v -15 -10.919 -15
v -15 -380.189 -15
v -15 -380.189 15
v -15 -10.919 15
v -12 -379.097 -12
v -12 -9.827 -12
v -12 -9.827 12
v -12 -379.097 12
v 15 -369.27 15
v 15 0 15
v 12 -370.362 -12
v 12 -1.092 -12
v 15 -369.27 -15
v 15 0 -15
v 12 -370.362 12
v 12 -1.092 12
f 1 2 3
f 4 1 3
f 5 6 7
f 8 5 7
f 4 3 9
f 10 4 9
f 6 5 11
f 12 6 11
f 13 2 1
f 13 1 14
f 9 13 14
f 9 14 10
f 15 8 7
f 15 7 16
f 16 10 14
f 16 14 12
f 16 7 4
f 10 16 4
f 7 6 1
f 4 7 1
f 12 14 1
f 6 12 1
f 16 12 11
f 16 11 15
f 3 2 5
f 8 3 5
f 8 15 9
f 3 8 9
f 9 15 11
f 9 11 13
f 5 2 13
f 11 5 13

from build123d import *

# Parameters (mm, degrees)
F0_W     = 30
F0_H     = 30
F0_W_2   = 24
F0_H_2   = 24
F1_DEPTH = 500
F3_DEPTH = 30.001


with BuildPart() as f1:
    # F0 (on Front) → F1 (new body)
    with BuildSketch(Plane.XZ):
        Rectangle(F0_W, F0_H)
        Rectangle(F0_W_2, F0_H_2, mode=Mode.SUBTRACT)
    extrude(amount=F1_DEPTH)

    # F2 (on face) → F3 (cut, through all)
    with BuildSketch(Plane(origin=(0, 0, -15), x_dir=(1, 0, 0), z_dir=(0, 0, -1))):
        Polygon((-15, 380.188794), (15, 369.269687), (15, 500), (-15, 500), align=None)
        Polygon((-15, 0), (15, 0), (-15, 10.919107), align=None)
    extrude(amount=-F3_DEPTH, mode=Mode.SUBTRACT)


solid = f1.part
